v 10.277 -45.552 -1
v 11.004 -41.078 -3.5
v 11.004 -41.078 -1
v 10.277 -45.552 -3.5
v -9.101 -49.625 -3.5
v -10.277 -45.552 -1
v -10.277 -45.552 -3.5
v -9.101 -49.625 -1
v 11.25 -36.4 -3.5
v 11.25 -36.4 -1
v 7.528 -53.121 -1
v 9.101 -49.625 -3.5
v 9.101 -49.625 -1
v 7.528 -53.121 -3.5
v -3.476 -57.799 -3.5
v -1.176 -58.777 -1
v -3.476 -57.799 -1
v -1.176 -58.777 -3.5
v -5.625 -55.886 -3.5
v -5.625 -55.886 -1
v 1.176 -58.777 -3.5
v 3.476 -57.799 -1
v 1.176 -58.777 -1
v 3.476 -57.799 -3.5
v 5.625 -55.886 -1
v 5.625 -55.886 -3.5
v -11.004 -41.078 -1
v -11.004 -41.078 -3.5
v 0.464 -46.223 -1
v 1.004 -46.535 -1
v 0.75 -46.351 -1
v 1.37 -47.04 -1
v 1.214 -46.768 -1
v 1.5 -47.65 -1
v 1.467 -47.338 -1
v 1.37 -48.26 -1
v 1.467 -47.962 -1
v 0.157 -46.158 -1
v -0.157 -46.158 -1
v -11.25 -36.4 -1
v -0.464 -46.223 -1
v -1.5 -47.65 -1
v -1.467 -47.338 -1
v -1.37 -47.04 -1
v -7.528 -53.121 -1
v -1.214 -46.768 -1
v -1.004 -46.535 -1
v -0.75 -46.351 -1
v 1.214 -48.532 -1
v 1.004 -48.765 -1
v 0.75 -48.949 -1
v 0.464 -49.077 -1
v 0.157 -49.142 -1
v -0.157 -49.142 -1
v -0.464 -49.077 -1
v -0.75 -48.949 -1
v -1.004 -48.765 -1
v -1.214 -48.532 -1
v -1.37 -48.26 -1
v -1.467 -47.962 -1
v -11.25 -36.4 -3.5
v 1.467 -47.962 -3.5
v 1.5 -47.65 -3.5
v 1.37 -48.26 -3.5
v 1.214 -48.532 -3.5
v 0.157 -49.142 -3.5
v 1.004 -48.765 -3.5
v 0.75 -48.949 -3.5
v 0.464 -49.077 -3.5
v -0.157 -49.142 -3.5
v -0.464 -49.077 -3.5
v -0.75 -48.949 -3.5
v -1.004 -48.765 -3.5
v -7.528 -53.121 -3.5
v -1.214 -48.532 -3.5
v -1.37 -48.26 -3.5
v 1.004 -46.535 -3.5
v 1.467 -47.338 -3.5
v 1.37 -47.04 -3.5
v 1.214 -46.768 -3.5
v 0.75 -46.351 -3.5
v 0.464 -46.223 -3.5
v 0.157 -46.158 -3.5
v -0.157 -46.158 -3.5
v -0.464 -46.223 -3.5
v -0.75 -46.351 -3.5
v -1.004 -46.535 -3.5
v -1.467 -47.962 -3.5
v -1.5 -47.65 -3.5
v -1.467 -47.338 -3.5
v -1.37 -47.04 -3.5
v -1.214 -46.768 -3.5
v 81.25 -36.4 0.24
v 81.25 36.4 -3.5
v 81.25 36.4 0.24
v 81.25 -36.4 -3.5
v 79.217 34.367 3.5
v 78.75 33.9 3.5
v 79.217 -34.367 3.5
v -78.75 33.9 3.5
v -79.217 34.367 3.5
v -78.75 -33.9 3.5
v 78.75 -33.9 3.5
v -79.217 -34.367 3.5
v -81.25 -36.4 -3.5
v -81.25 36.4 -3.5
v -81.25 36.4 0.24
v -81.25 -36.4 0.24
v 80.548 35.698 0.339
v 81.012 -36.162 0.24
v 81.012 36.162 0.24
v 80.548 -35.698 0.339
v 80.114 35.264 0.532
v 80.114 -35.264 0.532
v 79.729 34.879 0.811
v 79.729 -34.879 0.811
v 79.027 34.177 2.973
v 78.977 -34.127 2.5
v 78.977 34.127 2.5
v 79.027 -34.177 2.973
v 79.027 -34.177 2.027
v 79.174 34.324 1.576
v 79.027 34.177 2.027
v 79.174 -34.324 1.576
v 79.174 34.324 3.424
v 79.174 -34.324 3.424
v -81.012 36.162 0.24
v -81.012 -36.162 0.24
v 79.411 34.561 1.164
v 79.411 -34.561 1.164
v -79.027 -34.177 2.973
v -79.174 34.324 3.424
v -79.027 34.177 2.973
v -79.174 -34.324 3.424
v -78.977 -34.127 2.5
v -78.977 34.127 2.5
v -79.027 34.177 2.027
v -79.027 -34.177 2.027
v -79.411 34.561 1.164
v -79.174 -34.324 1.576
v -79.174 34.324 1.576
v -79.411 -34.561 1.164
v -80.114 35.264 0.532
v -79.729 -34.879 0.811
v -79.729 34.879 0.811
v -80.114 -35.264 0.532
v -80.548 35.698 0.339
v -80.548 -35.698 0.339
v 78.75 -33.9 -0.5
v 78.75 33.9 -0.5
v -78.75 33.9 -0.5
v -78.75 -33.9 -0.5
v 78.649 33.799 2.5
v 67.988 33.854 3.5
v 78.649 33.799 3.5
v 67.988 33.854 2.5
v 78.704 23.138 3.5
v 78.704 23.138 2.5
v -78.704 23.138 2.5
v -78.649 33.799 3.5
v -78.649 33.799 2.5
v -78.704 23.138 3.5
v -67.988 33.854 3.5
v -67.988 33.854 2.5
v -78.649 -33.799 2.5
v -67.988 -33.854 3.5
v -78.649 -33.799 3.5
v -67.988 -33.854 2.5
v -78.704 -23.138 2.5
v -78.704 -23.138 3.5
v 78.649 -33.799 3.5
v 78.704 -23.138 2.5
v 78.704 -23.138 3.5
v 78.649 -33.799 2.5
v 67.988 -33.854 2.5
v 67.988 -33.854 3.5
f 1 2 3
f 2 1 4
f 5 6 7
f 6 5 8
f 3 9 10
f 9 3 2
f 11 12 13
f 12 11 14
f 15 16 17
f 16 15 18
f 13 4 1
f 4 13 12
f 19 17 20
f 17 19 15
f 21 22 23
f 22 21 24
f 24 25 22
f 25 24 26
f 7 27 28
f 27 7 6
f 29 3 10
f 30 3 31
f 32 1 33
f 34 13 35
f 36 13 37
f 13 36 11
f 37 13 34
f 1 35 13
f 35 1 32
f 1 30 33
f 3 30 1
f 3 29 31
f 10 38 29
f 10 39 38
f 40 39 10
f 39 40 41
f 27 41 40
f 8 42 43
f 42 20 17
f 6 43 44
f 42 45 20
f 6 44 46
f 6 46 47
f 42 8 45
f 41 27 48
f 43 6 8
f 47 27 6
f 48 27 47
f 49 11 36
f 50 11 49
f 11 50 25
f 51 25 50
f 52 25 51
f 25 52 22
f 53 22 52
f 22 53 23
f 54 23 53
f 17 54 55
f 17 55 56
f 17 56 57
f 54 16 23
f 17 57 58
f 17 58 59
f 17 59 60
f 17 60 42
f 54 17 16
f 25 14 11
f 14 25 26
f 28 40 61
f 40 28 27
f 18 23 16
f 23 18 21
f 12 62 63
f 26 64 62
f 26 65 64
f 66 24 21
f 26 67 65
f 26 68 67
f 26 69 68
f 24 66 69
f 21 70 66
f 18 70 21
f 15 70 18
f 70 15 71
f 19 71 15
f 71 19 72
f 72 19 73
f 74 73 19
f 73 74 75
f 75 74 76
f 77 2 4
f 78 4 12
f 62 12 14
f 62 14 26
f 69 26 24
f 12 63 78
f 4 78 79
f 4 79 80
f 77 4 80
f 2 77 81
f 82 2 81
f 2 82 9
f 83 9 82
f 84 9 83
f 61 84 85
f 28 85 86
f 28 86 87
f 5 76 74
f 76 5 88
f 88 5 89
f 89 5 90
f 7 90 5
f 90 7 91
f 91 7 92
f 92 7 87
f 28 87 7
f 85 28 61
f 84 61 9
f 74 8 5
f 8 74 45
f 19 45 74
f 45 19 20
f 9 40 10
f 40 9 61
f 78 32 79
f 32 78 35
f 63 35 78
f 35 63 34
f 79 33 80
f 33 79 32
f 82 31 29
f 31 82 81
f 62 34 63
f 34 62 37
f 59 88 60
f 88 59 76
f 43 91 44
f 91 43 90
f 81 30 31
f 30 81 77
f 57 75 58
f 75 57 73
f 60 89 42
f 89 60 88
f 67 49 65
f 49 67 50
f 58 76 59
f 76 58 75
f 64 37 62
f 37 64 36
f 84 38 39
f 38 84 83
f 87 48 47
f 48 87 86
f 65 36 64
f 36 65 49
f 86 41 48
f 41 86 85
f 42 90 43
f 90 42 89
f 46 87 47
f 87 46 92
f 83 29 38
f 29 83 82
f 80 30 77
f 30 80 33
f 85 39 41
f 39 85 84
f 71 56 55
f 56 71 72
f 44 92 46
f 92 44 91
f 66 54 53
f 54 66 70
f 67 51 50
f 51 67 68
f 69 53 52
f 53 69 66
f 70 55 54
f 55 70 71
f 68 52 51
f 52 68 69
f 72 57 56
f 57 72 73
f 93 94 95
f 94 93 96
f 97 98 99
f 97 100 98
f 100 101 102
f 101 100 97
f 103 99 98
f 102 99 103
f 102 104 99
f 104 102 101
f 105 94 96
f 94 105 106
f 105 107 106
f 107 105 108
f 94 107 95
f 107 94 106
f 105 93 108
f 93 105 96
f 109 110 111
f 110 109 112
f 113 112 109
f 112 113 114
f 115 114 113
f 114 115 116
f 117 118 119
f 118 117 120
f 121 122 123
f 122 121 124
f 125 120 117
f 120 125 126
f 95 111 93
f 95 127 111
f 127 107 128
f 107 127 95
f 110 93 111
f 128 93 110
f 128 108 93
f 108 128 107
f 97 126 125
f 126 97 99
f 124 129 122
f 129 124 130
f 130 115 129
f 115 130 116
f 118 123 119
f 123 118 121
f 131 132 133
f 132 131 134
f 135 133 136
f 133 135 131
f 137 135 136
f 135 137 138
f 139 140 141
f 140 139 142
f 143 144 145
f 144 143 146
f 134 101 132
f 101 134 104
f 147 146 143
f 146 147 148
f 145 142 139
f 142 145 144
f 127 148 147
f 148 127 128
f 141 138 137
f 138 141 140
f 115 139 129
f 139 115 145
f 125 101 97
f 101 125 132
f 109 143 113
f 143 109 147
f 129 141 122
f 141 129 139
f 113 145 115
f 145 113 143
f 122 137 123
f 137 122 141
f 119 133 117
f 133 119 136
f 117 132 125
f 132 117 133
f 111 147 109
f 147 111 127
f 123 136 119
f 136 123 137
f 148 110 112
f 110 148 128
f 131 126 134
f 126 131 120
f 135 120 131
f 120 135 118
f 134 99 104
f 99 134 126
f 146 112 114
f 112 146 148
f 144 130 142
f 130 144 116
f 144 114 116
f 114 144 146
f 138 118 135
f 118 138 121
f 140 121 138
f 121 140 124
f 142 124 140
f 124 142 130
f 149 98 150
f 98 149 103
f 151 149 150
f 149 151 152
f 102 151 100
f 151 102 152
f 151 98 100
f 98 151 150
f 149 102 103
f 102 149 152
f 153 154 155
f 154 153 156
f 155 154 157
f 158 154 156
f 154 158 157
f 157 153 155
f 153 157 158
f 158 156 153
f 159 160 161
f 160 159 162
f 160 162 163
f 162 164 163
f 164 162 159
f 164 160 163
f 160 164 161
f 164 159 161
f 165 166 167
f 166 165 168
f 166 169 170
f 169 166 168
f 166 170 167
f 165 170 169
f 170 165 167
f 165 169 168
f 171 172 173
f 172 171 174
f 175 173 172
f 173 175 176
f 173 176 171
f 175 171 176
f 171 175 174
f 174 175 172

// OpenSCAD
//------------------Variables------------------\\ 

		//----Global Values----\\
			//The default unit in OpenSCAD is mm and this unit variable allows one to change the variables in the code with units other than mm. Default is 1, for mm, but cm is 10 and inches is 25.4. Note that this entails that you change EVERY variable (except maybe sfn)  so that one piece of the model is not ridiculously bigger/smaller than the other parts. 
				unit=1;

			//The detail in the cylinders/spheres of the shape.
				sfn=30;

		//----Bill Specifics----\\

			//The length of the bill.
				billength= 157.5;

			//The width of the bill. 
				billwidth = 67.8;

			//The thickness of the frame. 
				framethick = 5;
			
			//Bottom Thickness
				botthick = 2 ;

		//----Frame Specifics----\\

			//The border of the frame length-wise. This is the measurement from the inside of the frame to the outisde on the length (x) axis. The cylinders that shape the frame use this measurement.
				xframe = 5;

			//The border of the frame width-wise. This is the measurement from the inside of the frame to the outisde on the width (y) axis.
				yframe = 5;
		
			//How prominent the frame shaping is. Play with this value. Default is 1.1.
				frameshapethick = 1.1;

			//How raised the frame shaping is. Play with this value as well. 
				frameshaperaise = 0;


	//----Bill holder----\\
	billholdx=5*unit;
	billholdz=1*unit;
	billholdlift=2.5*unit;
	
	//----Hook sizing----\\
		//Hook size
		hooksize=22.5;

		//Hook hole size
		hookhole=3;

		//Hook thickness
		hookthick=2.5;

//-------------------Modules-------------------\\ 

	//----Basic Frame Shapes----\\
		module bill() {
			cube([billength*unit, billwidth*unit,framethick*unit], center=true);
		}

		module outsideframe() { 
			cube([(billength+xframe)*unit, (billwidth+yframe)*unit, (framethick+botthick)*unit], center=true);
		}

	//----Frame shaping.----\\
		//Frame shaping cylinder on the X Axis.
			module xfsc() {
				cylinder(r=(framethick*unit)/(frameshapethick*2), h=(billwidth+yframe)*unit+xframe, center=true, $fn=sfn);
			}

		//Frame shaping cylinder on the Y Axis.
			module yfsc() {
				cylinder(r=(framethick*unit)/(frameshapethick*2), h=(billength+xframe)*unit+yframe, center=true, $fn=sfn);
			}

		//Frameshaping general module
			module frameshaping() {
				translate([(billength/2)*unit+xframe/2, 0, (framethick/2)*unit]) {
					rotate([90,0,0]) {
						xfsc();
					}
				}
				translate([(-billength/2)*unit-xframe/2, 0, (framethick/2)*unit]) {
					rotate([90,0,0]) {
						xfsc();
					}
				}

				translate([0, (billwidth/2)*unit+yframe/2, (framethick/2)*unit]) {
					rotate([90,0,90]) {
						yfsc();
					}
				}
				translate([0, (-billwidth/2)*unit-yframe/2, (framethick/2)*unit]) {
					rotate([90,0,90]) {
						yfsc();
					}
				}
			}

	






module billhold(){
	translate([billength/2-billholdx/1.375, billwidth/2-billholdx/1.375, billholdlift]) {
		rotate([0,0,45]) {
			scale([1,1.75,1]){
				cylinder($fn=3, r=billholdx, h=billholdz);
			}
		}
	}

	translate([-billength/2+billholdx/1.375, billwidth/2-billholdx/1.375, billholdlift]) {
		rotate([0,0,135]) {
			scale([1,1.75,1]){
				cylinder($fn=3, r=billholdx, h=billholdz);
			}
		}
	}
	translate([-billength/2+billholdx/1.375, -billwidth/2+billholdx/1.375, billholdlift]) {
		rotate([0,0,225]) {
			scale([1,1.75,1]){
				cylinder($fn=3, r=billholdx, h=billholdz);
			}
		}
	}

	translate([billength/2-billholdx/1.375, -billwidth/2+billholdx/1.375, billholdlift]) {
		rotate([0,0,315]) {
			scale([1,1.75,1]){
				cylinder($fn=3, r=billholdx, h=billholdz);
			}
		}
	}





}
		
	module hook() {
		translate([0,-((billwidth+xframe)/2)*unit, (-(framethick+botthick)/2)*unit ]) {
			difference() {
				scale([1,2,1]) {
					cylinder(r=(hooksize/2)*unit, h=hookthick*unit, $fn=sfn);
				}
				translate([(-hooksize/2)*unit, 0]) {
					cube([hooksize*unit, hooksize*unit, hookthick*unit]);
				}
				translate([0, (-hooksize/2)*unit, 0]) {
					cylinder(r=(hookhole/2)*unit, h=hookthick*unit, $fn=sfn);
				}
			}
		}
	}


	//Plating module
	module frame1() {
		difference() {
			union(){
				outsideframe();
				hook();
			}
			translate([0,0, botthick]) {
				bill();
			}
			translate([0,0, frameshaperaise]) {
				frameshaping();
			}
			
		}
	}

	module frame(){
	frame1();
	billhold();
}

frame();
